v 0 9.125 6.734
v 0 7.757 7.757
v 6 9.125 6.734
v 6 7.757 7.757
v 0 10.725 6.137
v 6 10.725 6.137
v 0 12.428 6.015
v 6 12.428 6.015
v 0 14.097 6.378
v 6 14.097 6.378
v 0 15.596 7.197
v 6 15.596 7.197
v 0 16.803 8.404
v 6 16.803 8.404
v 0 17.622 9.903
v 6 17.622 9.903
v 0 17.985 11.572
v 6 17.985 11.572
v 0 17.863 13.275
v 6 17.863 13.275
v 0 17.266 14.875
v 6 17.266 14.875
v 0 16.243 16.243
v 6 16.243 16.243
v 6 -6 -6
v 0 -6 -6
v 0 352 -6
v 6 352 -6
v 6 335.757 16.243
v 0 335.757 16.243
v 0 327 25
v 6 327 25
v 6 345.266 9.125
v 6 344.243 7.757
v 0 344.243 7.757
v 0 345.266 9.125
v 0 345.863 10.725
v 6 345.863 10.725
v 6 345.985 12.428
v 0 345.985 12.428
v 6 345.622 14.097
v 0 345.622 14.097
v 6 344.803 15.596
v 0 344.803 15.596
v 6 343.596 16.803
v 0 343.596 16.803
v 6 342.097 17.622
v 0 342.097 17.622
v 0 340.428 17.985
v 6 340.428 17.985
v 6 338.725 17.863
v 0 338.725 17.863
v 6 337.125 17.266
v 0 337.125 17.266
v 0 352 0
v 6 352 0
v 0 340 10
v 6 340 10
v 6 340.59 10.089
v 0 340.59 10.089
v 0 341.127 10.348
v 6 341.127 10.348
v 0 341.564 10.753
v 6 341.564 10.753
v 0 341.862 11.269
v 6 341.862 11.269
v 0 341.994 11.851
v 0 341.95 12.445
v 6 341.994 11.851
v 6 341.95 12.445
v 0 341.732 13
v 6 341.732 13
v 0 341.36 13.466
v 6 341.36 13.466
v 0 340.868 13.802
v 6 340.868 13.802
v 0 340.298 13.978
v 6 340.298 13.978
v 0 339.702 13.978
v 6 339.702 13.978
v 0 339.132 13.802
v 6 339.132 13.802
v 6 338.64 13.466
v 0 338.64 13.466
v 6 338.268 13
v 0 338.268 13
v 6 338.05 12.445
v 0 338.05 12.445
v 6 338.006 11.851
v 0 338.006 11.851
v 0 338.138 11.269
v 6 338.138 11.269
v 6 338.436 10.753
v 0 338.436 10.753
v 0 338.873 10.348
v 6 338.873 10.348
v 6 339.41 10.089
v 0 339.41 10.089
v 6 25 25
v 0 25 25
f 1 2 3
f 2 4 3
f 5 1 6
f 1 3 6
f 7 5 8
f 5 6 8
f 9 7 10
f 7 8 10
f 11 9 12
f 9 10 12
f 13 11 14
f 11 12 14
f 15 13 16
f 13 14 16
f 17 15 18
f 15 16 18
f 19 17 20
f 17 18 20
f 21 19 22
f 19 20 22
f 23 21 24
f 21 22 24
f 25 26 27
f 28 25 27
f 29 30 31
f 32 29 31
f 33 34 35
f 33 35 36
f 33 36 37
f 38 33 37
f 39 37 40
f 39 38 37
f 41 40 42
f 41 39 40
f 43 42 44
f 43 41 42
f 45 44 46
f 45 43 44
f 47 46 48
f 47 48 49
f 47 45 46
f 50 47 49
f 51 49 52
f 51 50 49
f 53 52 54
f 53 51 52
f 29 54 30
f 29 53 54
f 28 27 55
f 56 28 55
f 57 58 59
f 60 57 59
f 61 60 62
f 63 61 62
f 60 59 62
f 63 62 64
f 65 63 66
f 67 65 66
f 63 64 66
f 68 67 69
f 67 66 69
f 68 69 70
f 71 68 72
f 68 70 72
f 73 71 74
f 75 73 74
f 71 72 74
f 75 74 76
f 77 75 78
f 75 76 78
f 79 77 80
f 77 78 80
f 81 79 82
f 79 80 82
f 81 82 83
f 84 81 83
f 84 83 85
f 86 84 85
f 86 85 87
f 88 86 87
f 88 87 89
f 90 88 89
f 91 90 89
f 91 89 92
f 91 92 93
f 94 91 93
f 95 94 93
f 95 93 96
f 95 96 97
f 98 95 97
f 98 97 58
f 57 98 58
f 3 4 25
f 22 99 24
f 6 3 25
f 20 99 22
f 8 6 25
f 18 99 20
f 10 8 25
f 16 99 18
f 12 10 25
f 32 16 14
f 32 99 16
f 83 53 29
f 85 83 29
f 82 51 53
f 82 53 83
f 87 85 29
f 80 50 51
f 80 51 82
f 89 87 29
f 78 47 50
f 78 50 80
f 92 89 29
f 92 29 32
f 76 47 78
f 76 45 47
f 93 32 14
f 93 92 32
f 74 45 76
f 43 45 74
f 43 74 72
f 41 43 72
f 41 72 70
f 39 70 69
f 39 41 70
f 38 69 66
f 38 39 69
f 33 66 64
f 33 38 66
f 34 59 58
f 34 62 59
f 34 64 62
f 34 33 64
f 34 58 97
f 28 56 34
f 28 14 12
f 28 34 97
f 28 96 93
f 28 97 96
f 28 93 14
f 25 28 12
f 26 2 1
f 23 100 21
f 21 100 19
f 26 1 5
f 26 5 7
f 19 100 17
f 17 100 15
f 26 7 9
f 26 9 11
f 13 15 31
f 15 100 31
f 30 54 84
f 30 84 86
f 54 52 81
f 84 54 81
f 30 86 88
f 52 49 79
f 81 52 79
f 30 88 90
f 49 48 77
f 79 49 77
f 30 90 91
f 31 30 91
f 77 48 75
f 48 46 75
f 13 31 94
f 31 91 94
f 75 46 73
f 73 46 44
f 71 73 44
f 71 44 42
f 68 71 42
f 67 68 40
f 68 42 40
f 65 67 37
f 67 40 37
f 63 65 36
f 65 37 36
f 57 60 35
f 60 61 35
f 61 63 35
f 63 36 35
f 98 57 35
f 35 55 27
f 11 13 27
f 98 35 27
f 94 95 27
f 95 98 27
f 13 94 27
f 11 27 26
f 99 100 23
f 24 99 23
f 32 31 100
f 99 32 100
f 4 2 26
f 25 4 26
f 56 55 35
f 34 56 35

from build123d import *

# Parameters (mm, degrees)
BOSS_EXTRUDE1_DEPTH = 6
SKETCH4_R           = 6
BOSS_EXTRUDE2_DEPTH = 6
SKETCH3_R           = 2
SKETCH3_R_2         = 6
CUT_EXTRUDE1_DEPTH  = 353.937671551


with BuildPart() as part:
    # Sketch2 → Boss-Extrude1 (new body)
    with BuildSketch(Plane(origin=(0, 0, 0), x_dir=(0, 0, -1), z_dir=(1, 0, 0))):
        Polygon((6, 352), (0, 352), (-25, 327), (-25, 25), (6, -6), align=None)
    extrude(amount=BOSS_EXTRUDE1_DEPTH)

    # Sketch4 → Boss-Extrude2 (add)
    with BuildSketch(Plane(origin=(6, 0, 0), x_dir=(0, 0, -1), z_dir=(1, 0, 0))):
        with Locations((-12, 340)):
            Circle(SKETCH4_R)
    extrude(amount=-BOSS_EXTRUDE2_DEPTH)

    # Sketch3 → Cut-Extrude1 (cut, through all)
    with BuildSketch(Plane(origin=(6, 0, 0), x_dir=(0, 0, -1), z_dir=(1, 0, 0))):
        with Locations((-12, 340)):
            Circle(SKETCH3_R)
        with Locations((-12, 12)):
            Circle(SKETCH3_R_2)
    extrude(amount=-CUT_EXTRUDE1_DEPTH, mode=Mode.SUBTRACT)


solid = part.part
